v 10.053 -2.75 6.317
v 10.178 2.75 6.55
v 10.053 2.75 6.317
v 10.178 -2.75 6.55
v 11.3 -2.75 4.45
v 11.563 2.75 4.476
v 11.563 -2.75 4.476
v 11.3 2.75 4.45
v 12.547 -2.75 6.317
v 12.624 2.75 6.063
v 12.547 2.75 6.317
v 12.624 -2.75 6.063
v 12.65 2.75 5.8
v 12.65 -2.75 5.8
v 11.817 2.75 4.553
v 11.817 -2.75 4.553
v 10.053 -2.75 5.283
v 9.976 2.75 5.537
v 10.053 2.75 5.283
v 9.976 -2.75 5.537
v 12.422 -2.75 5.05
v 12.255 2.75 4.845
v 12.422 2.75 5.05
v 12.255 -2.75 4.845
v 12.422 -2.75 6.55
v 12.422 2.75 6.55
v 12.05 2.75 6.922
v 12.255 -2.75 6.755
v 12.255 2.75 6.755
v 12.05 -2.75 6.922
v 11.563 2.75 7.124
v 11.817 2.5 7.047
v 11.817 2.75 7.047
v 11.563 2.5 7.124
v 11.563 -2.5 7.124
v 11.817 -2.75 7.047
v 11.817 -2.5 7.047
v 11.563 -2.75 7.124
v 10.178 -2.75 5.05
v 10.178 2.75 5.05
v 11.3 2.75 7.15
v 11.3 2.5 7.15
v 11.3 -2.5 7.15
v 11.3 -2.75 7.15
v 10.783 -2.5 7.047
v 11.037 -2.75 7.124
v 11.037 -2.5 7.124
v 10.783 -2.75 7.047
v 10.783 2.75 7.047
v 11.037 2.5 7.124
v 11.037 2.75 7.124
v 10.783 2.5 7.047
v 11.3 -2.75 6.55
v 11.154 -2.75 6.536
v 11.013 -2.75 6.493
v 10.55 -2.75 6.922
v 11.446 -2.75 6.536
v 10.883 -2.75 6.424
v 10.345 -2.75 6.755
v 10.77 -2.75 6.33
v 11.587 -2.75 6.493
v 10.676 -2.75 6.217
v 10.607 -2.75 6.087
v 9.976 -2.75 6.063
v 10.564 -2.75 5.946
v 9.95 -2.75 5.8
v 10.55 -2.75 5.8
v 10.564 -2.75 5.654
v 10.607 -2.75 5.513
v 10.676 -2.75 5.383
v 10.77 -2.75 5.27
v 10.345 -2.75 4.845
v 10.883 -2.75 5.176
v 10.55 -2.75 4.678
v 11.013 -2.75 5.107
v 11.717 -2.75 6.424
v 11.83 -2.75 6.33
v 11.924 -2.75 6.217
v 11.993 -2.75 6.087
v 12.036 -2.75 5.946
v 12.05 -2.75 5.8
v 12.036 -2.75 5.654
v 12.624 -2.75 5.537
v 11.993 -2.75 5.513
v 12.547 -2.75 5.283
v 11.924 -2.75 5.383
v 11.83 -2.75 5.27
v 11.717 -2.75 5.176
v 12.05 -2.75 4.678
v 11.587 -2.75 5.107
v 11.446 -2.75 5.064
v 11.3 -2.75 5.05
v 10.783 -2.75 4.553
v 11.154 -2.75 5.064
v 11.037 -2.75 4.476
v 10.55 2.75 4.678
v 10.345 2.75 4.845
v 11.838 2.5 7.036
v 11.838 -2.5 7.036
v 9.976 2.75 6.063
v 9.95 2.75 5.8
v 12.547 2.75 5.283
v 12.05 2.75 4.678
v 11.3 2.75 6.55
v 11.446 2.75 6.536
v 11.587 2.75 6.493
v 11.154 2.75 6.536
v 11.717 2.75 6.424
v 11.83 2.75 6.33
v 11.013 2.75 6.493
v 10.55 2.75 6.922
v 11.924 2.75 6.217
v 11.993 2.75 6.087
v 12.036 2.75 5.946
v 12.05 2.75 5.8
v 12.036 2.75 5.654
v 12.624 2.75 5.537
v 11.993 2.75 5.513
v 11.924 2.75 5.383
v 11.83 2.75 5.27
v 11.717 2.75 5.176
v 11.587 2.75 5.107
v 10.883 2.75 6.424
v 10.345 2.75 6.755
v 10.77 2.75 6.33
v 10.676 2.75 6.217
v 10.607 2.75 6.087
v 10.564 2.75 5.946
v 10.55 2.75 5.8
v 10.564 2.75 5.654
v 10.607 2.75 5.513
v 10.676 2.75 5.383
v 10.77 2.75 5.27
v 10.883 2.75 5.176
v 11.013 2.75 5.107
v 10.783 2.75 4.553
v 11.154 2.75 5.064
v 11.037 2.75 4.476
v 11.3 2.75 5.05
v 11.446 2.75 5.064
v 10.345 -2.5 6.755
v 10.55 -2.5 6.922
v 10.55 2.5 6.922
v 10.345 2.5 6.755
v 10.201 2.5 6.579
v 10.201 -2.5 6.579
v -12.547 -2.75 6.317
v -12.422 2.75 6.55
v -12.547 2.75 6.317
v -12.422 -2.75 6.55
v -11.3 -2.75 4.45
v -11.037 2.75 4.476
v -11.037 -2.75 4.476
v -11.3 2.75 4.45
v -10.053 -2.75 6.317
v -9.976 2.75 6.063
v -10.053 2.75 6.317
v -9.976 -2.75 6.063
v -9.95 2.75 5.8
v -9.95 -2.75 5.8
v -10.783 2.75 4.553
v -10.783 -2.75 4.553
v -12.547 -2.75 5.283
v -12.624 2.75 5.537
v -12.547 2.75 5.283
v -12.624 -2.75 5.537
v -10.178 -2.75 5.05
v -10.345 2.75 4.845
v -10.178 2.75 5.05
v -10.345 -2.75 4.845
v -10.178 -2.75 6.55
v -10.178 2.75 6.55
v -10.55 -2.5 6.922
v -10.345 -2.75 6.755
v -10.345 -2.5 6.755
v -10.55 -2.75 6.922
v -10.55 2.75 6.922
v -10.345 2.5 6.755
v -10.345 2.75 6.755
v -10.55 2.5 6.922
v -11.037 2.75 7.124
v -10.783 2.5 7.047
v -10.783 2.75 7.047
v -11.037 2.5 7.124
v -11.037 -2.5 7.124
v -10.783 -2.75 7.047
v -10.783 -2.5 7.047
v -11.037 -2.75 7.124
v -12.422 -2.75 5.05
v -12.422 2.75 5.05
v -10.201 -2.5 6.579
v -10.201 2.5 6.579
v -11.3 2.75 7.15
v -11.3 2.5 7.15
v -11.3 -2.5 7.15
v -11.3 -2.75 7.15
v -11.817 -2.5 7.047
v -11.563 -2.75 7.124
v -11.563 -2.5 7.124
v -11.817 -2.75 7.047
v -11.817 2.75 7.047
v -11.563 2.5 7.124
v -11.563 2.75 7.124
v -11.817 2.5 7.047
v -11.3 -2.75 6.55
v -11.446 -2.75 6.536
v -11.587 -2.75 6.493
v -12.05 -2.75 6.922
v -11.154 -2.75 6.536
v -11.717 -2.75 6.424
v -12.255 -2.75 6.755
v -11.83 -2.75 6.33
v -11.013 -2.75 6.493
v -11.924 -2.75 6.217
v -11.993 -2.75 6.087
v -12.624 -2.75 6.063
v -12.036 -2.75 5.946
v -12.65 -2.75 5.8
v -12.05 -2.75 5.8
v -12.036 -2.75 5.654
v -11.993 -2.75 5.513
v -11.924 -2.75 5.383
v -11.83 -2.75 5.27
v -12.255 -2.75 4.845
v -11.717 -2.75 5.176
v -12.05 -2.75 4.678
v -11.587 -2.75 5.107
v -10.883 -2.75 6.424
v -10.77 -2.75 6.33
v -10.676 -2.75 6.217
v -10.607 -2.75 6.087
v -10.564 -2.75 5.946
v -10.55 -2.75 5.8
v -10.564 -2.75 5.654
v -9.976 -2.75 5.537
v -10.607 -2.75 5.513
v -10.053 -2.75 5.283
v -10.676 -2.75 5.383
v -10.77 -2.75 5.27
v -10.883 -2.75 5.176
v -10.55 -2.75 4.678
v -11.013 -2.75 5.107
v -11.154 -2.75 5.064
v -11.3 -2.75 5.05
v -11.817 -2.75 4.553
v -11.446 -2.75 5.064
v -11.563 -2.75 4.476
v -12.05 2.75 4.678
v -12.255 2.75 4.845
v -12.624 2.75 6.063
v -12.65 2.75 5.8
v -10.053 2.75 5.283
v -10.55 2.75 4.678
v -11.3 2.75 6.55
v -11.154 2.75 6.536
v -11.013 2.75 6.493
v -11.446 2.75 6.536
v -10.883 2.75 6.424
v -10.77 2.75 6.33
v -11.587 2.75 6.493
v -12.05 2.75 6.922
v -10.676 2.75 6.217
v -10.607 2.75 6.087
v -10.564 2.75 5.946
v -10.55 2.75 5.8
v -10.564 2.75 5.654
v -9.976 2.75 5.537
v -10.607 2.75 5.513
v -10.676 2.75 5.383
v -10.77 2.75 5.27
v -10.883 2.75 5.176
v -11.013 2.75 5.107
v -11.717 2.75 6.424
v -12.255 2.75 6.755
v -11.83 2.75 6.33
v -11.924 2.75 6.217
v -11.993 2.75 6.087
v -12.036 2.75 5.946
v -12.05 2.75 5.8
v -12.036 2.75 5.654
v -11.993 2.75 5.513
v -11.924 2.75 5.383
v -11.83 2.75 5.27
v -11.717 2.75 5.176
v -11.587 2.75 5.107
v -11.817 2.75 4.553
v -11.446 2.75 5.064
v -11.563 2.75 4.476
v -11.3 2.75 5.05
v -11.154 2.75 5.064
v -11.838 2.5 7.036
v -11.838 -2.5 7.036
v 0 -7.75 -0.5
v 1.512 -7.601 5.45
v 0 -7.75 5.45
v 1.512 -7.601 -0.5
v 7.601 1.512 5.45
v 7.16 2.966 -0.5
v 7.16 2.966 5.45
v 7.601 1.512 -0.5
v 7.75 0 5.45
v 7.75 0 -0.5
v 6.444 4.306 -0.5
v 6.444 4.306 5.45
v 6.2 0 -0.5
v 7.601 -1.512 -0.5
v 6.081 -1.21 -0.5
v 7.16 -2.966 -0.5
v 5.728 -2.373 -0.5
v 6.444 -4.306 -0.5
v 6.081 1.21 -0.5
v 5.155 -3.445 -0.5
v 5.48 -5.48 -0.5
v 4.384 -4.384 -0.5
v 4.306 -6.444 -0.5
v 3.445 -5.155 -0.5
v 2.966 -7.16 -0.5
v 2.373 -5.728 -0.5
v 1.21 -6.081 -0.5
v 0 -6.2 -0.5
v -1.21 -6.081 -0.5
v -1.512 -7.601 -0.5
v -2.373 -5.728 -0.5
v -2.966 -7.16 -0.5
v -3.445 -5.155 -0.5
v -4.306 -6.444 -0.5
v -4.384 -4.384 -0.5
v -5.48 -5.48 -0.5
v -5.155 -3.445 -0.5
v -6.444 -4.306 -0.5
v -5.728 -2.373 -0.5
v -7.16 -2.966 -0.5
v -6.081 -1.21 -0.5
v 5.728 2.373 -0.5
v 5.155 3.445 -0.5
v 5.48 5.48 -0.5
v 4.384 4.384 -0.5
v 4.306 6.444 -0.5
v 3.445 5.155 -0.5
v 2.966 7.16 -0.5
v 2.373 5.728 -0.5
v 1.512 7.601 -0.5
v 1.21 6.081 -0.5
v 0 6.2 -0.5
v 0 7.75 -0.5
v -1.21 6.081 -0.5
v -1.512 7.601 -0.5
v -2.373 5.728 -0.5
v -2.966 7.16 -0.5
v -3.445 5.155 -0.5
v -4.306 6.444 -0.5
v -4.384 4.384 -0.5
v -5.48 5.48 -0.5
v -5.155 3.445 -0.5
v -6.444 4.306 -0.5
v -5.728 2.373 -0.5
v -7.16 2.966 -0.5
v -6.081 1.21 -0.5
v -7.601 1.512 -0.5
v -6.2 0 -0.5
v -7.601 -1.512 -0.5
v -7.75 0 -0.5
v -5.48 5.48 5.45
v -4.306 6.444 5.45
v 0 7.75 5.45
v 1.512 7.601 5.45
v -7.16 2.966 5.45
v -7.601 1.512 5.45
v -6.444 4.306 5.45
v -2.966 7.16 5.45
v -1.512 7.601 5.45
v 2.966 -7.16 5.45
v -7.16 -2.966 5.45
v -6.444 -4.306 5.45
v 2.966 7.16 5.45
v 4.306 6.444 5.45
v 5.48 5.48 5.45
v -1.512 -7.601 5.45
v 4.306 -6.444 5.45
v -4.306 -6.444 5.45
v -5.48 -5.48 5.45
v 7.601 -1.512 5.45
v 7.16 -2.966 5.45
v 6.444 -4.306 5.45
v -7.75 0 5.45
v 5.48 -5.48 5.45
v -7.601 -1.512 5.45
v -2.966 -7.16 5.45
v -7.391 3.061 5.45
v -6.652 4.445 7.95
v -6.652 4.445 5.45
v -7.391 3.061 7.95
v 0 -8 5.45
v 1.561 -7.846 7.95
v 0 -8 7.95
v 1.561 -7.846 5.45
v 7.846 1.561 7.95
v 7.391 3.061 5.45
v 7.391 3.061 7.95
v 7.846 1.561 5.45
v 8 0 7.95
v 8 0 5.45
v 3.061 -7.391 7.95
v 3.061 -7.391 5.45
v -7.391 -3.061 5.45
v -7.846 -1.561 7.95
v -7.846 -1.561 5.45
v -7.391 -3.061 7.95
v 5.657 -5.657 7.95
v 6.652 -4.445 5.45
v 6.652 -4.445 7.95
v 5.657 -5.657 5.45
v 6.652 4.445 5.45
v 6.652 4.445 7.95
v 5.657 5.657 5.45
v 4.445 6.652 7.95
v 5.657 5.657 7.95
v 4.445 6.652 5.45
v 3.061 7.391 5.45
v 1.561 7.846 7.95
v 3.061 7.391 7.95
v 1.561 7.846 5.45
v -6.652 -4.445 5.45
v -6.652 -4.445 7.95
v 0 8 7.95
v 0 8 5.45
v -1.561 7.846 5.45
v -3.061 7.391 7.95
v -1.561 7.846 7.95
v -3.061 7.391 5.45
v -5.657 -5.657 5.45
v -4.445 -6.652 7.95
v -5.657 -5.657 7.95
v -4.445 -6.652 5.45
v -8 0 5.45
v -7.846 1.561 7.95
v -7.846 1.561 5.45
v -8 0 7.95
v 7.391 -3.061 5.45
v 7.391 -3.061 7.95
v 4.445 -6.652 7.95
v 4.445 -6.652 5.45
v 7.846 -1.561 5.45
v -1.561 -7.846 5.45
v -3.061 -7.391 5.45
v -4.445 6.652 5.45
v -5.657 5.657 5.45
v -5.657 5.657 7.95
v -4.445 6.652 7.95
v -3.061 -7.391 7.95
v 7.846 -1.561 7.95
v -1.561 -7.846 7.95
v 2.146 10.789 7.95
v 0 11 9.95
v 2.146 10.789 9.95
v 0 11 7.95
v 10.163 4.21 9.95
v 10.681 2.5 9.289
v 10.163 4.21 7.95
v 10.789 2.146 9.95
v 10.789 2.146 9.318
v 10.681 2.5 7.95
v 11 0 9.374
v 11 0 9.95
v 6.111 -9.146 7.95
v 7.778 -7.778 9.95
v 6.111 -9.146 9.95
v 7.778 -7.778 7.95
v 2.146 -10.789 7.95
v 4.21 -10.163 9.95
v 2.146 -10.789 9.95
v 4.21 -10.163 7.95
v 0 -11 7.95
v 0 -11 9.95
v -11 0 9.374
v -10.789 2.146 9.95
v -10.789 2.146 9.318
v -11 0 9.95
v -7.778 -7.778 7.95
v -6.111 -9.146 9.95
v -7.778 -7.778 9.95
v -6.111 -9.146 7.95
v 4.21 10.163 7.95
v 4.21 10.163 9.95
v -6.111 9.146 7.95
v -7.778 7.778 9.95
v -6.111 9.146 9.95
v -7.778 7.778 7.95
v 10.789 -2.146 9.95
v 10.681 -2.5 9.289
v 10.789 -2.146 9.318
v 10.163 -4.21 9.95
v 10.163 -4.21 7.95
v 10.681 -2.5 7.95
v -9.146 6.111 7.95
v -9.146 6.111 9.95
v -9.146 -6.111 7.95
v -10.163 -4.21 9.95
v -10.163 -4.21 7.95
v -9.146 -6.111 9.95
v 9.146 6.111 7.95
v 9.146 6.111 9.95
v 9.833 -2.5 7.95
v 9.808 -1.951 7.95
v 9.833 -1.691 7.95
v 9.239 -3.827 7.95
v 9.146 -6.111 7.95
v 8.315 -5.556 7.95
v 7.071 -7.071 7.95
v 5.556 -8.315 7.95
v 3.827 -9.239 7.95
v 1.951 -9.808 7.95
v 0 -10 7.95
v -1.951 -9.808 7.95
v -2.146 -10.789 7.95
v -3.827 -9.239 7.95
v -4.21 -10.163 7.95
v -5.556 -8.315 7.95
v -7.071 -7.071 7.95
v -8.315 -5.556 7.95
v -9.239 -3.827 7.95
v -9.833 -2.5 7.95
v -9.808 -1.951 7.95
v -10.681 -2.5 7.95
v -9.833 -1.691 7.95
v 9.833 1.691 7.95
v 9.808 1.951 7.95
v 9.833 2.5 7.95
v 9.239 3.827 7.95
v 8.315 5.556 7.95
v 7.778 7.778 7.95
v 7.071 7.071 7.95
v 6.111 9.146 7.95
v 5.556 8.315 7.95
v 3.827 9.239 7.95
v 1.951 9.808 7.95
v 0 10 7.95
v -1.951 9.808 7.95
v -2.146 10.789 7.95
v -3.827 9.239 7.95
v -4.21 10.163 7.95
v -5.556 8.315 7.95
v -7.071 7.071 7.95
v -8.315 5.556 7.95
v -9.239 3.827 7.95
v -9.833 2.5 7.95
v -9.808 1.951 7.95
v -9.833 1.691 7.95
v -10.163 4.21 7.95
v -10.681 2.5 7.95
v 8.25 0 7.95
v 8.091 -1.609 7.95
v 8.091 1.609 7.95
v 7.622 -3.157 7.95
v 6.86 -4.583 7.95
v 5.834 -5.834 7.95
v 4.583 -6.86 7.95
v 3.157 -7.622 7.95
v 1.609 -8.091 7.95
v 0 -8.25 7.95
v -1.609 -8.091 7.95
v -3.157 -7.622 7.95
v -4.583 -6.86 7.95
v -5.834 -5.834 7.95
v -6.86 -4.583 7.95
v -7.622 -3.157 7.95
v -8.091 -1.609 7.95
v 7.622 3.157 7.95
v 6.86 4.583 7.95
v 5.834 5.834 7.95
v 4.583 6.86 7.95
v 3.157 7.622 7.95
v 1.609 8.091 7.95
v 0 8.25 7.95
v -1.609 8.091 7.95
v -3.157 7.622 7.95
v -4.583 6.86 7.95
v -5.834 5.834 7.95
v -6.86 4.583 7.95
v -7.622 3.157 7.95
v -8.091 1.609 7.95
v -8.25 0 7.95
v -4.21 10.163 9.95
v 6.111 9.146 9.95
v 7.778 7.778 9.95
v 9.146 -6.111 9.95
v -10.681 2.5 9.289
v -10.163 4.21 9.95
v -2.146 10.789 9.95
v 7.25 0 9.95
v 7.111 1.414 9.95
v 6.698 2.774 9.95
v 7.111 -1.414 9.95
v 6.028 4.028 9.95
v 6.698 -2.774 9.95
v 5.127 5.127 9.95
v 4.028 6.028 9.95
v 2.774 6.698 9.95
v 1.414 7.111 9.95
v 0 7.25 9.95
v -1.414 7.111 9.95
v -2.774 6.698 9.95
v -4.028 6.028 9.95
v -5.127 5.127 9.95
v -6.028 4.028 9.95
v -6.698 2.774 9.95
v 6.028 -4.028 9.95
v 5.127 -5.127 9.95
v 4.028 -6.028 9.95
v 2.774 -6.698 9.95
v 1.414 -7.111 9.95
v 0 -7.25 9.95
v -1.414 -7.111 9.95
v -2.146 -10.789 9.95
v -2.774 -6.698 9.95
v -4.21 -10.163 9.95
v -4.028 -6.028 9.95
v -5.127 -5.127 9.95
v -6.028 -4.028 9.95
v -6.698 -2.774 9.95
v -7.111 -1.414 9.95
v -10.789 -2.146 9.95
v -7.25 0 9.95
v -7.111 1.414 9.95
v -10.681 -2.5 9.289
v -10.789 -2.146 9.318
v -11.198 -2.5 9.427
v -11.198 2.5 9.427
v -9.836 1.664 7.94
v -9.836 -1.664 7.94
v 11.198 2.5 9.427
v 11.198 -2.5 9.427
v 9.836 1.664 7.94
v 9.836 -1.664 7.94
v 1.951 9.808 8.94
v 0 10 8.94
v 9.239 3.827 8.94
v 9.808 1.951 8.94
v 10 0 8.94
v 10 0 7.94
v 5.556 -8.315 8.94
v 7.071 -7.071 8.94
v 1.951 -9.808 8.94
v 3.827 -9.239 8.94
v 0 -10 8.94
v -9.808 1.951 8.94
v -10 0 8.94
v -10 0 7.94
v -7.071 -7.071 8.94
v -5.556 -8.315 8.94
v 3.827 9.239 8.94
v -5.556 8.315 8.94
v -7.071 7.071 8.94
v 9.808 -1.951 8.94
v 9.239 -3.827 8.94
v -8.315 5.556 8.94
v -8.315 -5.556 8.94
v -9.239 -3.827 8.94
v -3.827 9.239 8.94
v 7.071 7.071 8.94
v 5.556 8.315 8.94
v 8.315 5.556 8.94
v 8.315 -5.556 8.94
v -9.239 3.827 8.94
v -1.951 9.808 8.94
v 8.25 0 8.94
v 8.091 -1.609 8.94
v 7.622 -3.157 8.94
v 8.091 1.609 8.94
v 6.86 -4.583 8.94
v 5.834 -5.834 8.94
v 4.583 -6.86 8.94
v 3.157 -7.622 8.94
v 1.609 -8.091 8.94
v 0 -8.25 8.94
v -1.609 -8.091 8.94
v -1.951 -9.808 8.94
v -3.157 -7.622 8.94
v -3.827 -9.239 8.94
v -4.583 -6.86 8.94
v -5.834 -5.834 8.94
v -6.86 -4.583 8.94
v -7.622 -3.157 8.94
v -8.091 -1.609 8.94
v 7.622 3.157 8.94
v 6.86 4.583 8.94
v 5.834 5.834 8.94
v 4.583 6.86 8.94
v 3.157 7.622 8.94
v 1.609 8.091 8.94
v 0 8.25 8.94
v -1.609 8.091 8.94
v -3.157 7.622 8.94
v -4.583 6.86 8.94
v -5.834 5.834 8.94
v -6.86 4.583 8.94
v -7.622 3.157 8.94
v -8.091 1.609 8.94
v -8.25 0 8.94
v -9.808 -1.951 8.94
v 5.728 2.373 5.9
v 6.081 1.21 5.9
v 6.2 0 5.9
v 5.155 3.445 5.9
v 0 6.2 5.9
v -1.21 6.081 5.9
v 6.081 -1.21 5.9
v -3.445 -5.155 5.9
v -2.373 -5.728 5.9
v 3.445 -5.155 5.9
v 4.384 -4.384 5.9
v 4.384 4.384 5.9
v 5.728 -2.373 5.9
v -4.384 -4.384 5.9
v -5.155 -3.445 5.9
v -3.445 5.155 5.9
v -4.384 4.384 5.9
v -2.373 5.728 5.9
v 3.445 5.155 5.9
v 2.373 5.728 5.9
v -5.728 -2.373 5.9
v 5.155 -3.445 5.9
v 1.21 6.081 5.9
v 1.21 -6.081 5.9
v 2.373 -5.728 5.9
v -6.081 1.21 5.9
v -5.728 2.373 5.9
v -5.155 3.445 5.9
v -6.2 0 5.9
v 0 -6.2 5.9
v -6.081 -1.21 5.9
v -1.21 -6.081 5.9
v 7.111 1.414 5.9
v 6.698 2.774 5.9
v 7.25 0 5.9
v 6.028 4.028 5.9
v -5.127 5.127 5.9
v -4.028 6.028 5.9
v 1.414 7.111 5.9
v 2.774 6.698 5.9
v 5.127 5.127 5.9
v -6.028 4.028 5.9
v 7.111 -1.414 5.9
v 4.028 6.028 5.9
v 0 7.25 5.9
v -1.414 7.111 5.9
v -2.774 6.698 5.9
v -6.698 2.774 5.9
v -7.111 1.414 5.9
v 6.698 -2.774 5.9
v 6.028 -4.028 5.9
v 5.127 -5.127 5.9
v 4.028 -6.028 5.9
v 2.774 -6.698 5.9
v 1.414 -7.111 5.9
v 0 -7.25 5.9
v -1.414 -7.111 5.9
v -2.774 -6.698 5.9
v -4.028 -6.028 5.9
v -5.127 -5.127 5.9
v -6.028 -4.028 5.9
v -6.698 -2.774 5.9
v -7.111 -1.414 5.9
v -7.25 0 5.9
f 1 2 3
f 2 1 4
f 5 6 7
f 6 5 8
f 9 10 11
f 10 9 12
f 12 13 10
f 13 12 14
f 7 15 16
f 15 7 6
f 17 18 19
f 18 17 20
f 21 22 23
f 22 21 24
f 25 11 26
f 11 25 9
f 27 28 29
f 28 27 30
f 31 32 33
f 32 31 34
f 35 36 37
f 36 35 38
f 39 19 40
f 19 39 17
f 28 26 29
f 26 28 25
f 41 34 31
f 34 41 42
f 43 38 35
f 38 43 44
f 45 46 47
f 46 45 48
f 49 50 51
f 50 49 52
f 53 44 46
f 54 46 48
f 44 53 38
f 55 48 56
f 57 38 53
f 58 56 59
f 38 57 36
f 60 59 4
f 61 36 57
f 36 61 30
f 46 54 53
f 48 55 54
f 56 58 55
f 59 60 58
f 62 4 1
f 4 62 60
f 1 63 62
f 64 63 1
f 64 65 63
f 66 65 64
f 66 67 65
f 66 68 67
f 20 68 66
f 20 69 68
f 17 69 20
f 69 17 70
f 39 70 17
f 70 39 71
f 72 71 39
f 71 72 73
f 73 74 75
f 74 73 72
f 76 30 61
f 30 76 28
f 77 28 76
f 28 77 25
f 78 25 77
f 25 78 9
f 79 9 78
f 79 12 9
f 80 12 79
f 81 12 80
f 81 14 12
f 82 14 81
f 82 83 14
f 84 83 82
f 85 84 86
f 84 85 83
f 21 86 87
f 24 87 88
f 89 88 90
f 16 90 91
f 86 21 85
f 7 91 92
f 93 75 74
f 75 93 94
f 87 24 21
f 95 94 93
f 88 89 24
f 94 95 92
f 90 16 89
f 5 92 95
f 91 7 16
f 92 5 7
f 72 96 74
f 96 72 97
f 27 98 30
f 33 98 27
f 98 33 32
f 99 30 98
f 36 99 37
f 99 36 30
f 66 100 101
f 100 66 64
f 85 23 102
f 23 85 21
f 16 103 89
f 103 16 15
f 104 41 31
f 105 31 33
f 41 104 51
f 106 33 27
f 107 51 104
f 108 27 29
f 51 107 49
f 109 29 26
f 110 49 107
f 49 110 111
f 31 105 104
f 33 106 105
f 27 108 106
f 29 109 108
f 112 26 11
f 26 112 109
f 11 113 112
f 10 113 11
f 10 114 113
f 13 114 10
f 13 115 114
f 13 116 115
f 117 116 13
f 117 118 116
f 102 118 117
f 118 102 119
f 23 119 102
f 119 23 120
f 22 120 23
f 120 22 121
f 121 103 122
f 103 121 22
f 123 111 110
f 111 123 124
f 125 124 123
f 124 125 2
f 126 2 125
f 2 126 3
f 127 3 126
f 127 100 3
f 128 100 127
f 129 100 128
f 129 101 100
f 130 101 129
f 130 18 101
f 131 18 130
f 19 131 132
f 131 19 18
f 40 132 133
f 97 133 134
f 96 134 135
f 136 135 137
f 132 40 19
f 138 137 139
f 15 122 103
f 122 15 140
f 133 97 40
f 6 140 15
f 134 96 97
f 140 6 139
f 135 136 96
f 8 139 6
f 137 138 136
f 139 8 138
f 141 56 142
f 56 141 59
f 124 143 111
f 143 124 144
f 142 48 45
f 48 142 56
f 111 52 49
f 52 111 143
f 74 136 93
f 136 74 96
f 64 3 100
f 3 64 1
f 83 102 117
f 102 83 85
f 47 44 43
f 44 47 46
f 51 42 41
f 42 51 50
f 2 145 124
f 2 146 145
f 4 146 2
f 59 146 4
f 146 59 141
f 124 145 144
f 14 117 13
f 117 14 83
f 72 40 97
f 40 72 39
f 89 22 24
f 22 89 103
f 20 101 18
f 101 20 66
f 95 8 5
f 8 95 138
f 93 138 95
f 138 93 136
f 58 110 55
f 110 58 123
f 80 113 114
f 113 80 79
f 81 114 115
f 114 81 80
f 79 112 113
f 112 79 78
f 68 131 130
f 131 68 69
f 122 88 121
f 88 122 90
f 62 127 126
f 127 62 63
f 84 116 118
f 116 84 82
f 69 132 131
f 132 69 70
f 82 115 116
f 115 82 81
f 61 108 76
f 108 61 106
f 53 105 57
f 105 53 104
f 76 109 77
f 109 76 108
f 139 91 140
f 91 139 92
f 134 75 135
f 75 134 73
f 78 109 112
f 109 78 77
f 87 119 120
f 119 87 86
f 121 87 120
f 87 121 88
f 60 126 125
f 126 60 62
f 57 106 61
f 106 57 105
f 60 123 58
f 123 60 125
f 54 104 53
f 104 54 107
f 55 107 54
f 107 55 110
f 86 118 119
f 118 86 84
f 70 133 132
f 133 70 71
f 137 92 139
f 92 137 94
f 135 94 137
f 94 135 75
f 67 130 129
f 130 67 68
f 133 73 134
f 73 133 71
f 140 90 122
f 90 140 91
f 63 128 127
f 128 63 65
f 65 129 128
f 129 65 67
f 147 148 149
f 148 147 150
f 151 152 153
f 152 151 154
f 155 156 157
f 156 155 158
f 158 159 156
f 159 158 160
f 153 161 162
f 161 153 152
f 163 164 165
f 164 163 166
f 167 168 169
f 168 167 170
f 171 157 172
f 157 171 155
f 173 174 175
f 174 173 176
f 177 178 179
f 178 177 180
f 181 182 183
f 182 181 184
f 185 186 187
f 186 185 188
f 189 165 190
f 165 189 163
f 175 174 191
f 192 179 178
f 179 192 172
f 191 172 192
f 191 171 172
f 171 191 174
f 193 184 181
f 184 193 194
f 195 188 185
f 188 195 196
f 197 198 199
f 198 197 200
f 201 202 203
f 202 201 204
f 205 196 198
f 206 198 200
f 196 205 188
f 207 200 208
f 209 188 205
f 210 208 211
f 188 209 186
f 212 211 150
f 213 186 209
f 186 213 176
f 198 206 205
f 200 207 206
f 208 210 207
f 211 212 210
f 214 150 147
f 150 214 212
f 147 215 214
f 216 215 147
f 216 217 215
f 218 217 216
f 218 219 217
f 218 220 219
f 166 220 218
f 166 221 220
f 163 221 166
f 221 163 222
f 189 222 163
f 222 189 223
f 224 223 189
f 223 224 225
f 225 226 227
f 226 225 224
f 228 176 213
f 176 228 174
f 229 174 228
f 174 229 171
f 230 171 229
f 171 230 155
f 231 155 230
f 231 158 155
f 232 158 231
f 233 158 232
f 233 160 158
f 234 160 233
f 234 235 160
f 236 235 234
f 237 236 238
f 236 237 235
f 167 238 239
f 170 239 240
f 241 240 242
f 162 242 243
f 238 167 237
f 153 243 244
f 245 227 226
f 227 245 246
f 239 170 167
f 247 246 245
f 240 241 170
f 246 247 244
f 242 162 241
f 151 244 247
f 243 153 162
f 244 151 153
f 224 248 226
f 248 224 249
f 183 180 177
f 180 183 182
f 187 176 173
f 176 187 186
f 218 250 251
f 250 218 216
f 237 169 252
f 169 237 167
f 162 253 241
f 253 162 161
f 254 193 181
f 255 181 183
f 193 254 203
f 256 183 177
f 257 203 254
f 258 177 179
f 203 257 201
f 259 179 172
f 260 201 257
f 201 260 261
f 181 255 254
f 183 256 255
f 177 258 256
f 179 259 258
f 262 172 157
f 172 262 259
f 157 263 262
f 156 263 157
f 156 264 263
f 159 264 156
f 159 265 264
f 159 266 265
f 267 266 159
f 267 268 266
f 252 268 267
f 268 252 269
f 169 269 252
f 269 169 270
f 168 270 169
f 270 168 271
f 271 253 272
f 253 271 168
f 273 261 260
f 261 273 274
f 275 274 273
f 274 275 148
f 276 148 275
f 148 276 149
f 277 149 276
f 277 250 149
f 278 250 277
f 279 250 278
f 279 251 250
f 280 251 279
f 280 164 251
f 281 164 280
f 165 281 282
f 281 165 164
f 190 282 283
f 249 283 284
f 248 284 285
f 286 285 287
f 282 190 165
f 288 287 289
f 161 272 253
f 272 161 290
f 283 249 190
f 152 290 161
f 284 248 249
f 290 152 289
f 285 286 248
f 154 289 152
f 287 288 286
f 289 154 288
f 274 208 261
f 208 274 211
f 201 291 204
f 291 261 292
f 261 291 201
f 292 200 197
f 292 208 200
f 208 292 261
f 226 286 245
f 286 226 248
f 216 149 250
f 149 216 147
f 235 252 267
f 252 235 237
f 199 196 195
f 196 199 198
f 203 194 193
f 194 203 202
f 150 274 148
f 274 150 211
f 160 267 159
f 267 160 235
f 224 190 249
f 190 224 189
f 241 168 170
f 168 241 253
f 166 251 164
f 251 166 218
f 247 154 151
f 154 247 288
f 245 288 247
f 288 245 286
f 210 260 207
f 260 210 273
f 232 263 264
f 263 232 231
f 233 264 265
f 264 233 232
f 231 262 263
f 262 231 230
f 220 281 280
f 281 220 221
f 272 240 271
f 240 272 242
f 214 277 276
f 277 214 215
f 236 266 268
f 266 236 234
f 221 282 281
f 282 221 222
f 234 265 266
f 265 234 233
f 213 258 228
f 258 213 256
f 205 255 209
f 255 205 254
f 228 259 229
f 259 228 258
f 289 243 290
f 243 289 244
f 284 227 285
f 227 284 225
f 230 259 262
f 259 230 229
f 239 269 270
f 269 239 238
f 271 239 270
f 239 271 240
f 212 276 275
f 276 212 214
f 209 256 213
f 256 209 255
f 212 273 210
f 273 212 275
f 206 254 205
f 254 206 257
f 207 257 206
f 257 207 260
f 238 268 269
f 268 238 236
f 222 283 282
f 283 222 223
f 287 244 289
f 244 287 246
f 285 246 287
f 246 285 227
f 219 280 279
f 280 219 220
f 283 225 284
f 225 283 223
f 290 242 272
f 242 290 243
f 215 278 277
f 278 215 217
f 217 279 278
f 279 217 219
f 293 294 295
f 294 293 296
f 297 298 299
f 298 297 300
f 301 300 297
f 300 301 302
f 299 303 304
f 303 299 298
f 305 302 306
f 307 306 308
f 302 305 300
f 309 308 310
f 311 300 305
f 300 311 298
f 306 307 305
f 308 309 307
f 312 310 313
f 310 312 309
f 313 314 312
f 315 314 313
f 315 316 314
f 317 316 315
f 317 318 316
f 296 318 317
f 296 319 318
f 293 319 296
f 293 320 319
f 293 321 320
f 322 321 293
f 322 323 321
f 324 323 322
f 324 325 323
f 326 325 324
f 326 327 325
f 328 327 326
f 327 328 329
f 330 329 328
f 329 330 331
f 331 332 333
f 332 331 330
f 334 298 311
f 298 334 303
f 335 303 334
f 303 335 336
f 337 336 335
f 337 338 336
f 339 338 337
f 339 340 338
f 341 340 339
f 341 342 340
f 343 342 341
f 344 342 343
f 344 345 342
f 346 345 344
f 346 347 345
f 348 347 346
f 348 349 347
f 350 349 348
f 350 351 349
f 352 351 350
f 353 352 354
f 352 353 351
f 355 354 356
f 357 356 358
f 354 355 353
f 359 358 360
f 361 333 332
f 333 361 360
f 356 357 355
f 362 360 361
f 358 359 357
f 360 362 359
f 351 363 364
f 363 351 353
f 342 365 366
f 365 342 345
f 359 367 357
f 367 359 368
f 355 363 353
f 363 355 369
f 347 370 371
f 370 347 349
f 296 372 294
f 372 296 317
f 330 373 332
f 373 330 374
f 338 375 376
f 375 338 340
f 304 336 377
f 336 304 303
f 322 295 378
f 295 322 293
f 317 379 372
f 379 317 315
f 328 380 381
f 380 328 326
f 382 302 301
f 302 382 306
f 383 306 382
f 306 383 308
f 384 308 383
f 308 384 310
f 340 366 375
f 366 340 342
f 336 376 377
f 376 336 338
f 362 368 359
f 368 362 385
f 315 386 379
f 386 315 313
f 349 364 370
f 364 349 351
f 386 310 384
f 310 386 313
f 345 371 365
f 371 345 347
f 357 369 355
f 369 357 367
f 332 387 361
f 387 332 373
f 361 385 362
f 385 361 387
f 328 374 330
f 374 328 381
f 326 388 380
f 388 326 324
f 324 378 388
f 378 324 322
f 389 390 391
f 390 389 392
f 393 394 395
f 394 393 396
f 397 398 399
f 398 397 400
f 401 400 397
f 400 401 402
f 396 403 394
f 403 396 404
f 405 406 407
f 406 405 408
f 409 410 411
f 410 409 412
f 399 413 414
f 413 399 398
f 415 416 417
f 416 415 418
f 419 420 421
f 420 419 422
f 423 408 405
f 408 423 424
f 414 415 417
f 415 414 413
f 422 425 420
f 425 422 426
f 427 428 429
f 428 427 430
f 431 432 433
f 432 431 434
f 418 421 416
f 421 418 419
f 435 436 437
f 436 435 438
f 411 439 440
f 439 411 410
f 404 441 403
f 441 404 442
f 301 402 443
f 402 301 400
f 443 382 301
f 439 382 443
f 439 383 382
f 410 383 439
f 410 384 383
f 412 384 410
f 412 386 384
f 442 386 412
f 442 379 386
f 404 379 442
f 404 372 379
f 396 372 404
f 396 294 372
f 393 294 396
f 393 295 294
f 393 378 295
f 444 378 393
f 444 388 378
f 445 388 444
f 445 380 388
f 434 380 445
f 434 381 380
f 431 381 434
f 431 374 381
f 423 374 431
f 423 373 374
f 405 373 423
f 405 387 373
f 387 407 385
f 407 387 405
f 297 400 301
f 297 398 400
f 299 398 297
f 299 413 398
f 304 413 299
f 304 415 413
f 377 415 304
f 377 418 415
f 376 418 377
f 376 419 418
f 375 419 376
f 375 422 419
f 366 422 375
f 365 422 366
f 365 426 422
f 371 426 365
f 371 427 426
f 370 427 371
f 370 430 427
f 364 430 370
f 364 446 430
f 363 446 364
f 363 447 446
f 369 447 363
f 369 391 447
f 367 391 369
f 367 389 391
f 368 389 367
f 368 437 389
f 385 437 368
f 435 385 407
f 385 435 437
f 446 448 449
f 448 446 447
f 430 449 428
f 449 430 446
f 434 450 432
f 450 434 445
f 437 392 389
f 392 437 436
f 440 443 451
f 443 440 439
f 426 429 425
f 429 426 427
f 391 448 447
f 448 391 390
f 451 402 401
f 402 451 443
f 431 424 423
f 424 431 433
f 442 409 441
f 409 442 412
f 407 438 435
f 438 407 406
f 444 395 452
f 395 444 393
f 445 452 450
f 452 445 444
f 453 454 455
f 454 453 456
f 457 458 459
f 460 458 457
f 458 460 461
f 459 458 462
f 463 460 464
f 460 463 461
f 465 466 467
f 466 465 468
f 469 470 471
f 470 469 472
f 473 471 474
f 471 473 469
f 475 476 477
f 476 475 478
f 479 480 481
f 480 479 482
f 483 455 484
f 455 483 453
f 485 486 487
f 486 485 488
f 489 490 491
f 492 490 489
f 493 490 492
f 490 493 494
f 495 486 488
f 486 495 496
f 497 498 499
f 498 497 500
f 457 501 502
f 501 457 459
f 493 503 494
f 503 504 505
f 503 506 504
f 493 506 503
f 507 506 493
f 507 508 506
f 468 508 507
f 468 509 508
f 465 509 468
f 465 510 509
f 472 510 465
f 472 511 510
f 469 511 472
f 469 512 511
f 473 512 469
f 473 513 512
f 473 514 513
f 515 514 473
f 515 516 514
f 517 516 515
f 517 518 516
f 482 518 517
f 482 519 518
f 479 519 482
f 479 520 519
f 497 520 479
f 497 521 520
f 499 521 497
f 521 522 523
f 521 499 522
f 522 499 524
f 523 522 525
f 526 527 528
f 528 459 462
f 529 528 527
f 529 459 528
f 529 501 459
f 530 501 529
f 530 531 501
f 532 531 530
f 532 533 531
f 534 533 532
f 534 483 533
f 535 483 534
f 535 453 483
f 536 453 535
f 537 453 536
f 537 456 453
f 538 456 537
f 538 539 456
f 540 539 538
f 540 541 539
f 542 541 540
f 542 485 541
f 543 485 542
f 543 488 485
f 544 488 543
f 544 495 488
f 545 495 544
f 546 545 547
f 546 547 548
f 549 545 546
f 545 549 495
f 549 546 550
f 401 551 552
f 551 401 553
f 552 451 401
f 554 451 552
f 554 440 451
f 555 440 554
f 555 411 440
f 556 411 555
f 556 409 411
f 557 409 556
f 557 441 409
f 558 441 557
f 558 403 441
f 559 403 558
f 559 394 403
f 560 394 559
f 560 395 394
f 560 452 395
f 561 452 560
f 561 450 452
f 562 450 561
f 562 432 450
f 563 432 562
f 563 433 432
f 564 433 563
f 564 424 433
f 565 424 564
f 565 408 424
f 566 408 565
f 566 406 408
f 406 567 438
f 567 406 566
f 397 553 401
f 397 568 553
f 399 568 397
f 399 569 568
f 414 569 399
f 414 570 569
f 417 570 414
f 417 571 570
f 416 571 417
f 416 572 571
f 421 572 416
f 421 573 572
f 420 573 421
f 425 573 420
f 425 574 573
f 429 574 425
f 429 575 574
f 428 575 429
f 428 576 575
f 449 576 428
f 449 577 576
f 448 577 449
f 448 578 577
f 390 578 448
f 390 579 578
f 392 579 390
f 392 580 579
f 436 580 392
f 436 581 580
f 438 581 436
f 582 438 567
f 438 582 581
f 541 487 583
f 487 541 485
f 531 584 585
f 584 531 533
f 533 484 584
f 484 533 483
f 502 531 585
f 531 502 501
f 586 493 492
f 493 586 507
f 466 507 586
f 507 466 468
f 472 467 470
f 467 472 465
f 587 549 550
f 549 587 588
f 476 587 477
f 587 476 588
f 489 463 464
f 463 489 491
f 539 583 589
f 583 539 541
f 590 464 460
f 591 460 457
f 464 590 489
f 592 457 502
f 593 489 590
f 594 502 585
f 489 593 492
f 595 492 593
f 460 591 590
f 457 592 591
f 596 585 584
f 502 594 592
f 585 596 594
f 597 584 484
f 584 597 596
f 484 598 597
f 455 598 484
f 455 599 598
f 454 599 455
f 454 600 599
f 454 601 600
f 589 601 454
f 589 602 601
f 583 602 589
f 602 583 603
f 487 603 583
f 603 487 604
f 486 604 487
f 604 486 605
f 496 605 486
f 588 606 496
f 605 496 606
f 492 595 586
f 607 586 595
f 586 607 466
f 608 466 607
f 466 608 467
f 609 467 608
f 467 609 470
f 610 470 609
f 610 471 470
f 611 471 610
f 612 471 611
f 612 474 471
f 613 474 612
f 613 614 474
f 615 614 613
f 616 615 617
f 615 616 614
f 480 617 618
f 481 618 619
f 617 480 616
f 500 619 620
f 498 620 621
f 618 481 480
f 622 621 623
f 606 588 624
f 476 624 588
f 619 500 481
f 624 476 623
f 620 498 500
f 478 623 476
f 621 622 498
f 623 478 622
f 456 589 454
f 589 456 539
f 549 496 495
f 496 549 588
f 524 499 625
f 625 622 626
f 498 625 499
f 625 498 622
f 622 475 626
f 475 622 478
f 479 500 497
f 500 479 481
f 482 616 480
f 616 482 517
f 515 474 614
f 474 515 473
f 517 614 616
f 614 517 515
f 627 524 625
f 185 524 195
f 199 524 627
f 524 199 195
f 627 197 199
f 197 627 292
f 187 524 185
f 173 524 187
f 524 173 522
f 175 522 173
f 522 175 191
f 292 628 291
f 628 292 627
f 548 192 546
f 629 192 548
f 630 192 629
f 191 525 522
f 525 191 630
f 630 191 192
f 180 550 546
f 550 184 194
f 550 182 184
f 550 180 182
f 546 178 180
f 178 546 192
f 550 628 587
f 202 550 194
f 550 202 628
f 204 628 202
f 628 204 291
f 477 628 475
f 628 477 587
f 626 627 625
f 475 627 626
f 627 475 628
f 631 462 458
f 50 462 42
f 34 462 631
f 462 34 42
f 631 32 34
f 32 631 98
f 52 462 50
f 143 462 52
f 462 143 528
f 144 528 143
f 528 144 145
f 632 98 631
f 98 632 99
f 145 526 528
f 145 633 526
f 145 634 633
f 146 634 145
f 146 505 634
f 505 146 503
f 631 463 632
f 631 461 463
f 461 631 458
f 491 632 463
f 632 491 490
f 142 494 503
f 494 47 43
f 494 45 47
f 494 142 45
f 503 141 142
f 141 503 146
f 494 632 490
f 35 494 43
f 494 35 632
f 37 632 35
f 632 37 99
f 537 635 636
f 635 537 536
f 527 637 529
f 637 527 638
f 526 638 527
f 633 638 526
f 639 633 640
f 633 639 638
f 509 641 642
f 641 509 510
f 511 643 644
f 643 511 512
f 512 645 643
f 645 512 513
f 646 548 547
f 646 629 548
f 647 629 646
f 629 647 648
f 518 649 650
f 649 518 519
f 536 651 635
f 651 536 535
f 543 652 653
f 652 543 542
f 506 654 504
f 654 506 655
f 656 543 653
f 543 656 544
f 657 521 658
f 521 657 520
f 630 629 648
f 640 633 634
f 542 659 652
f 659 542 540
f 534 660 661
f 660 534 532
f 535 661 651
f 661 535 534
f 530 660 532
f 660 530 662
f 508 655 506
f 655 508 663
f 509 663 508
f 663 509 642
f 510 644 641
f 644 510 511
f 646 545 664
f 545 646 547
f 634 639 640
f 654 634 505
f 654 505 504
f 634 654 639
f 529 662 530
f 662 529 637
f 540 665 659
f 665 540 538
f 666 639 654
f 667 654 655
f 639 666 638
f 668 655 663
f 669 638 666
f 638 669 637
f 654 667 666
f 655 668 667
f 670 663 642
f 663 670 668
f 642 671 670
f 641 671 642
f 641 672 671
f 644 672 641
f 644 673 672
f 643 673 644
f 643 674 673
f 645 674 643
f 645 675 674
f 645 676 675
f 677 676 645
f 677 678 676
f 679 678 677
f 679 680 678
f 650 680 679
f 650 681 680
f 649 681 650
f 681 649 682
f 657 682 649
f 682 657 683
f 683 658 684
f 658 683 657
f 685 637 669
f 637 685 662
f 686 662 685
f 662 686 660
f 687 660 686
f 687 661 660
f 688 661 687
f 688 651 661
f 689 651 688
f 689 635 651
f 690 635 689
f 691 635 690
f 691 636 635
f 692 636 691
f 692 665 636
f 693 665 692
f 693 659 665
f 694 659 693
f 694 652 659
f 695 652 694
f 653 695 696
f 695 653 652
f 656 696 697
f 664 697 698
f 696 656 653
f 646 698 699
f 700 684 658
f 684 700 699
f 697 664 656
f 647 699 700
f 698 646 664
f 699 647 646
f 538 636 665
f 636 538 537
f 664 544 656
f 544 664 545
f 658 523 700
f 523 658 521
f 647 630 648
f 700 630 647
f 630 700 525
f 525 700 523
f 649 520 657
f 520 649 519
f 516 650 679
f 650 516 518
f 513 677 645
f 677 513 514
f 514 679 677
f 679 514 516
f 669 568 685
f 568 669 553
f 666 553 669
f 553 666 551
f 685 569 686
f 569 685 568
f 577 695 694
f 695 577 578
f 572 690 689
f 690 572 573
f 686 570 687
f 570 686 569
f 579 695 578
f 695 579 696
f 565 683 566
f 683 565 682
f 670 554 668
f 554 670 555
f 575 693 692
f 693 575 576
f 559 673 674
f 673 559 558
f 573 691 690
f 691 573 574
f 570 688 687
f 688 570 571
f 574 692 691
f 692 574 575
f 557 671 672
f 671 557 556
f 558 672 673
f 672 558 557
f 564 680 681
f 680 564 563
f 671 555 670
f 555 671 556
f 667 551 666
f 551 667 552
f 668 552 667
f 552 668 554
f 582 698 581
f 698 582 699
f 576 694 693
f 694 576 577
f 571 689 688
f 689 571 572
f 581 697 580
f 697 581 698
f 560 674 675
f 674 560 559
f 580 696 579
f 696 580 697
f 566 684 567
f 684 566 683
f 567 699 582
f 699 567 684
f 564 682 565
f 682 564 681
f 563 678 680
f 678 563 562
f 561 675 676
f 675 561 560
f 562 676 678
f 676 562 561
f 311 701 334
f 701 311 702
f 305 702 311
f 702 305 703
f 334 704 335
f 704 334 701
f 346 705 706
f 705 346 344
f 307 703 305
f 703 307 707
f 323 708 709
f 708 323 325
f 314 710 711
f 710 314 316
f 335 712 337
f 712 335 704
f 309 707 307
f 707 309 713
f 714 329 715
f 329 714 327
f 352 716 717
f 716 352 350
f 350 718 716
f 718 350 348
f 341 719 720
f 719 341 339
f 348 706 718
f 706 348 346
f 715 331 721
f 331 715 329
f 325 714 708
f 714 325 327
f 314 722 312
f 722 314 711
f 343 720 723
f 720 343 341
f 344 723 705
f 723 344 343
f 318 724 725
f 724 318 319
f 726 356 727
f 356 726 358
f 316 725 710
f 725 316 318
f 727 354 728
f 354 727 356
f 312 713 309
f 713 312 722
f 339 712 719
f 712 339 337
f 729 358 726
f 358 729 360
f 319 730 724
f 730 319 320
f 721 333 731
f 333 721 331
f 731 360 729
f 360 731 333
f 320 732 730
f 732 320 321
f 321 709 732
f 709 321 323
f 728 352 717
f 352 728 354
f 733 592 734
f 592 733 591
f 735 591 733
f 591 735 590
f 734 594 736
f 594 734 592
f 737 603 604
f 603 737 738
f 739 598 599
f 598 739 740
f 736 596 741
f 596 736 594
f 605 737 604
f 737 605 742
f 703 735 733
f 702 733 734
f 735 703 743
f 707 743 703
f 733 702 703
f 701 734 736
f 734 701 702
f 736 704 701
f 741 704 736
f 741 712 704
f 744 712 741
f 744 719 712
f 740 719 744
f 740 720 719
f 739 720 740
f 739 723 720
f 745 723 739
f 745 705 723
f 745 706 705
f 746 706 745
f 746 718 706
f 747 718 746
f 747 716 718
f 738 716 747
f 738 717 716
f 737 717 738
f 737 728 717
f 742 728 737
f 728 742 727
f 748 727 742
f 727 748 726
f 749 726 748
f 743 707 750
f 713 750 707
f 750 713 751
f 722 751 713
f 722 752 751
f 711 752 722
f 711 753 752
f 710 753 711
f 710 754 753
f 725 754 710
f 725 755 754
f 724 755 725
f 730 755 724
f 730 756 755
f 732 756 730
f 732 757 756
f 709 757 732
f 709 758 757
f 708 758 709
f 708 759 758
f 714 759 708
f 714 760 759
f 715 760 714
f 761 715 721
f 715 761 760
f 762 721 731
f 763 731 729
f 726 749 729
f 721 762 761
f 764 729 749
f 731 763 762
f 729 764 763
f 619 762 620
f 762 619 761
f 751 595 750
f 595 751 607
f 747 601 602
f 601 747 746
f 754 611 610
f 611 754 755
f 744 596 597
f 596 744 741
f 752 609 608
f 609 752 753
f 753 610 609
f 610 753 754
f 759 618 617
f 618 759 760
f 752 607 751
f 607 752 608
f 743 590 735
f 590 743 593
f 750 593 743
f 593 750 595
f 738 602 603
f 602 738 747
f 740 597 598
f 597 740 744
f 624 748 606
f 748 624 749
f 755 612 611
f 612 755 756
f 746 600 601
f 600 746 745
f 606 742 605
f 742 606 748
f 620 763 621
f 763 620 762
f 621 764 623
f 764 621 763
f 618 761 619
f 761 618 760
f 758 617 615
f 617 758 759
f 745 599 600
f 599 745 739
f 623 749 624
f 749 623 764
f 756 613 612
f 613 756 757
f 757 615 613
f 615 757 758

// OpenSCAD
$fn=32;

difference() {
  union() {
    translate([0,0,3])
    cylinder(d=15.5,h=7,center=true);
    translate([0,0,6.95])
    cylinder(d=16,h=3,center=true);
    translate([0,0,8.95])
    cylinder(d=22,h=2,center=true);

    translate([11.3,0,5.8])
    rotate([90,0,0])
    difference() {
      cylinder(d=2.7,h=5.5,center=true);
      cylinder(d=1.5,h=5.6,center=true);
    }

    translate([-11.3,0,5.8])
    rotate([90,0,0])
    difference() {
      cylinder(d=2.7,h=5.5,center=true);
      cylinder(d=1.5,h=5.6,center=true);
    }

    translate([-10.7,0,8])
    rotate([0,-75,0])
    cube([2.5,5,1.7],center=true);

    translate([10.7,0,8])
    rotate([0,75,0])
    cube([2.5,5,1.7],center=true);

  }
  cylinder(d=12.4,h=20,center=true);
  translate([0,0,-4.95])
  cylinder(d=13,h=3,center=true);

  translate([0,0,8])
  #cylinder(d=14.5,h=4.2,center=true);


  translate([0,0,8.44])
  difference() {
    cylinder(d=20,h=1,center=true);
    cylinder(d=16.5,h=1.1,center=true);      
  }
}
